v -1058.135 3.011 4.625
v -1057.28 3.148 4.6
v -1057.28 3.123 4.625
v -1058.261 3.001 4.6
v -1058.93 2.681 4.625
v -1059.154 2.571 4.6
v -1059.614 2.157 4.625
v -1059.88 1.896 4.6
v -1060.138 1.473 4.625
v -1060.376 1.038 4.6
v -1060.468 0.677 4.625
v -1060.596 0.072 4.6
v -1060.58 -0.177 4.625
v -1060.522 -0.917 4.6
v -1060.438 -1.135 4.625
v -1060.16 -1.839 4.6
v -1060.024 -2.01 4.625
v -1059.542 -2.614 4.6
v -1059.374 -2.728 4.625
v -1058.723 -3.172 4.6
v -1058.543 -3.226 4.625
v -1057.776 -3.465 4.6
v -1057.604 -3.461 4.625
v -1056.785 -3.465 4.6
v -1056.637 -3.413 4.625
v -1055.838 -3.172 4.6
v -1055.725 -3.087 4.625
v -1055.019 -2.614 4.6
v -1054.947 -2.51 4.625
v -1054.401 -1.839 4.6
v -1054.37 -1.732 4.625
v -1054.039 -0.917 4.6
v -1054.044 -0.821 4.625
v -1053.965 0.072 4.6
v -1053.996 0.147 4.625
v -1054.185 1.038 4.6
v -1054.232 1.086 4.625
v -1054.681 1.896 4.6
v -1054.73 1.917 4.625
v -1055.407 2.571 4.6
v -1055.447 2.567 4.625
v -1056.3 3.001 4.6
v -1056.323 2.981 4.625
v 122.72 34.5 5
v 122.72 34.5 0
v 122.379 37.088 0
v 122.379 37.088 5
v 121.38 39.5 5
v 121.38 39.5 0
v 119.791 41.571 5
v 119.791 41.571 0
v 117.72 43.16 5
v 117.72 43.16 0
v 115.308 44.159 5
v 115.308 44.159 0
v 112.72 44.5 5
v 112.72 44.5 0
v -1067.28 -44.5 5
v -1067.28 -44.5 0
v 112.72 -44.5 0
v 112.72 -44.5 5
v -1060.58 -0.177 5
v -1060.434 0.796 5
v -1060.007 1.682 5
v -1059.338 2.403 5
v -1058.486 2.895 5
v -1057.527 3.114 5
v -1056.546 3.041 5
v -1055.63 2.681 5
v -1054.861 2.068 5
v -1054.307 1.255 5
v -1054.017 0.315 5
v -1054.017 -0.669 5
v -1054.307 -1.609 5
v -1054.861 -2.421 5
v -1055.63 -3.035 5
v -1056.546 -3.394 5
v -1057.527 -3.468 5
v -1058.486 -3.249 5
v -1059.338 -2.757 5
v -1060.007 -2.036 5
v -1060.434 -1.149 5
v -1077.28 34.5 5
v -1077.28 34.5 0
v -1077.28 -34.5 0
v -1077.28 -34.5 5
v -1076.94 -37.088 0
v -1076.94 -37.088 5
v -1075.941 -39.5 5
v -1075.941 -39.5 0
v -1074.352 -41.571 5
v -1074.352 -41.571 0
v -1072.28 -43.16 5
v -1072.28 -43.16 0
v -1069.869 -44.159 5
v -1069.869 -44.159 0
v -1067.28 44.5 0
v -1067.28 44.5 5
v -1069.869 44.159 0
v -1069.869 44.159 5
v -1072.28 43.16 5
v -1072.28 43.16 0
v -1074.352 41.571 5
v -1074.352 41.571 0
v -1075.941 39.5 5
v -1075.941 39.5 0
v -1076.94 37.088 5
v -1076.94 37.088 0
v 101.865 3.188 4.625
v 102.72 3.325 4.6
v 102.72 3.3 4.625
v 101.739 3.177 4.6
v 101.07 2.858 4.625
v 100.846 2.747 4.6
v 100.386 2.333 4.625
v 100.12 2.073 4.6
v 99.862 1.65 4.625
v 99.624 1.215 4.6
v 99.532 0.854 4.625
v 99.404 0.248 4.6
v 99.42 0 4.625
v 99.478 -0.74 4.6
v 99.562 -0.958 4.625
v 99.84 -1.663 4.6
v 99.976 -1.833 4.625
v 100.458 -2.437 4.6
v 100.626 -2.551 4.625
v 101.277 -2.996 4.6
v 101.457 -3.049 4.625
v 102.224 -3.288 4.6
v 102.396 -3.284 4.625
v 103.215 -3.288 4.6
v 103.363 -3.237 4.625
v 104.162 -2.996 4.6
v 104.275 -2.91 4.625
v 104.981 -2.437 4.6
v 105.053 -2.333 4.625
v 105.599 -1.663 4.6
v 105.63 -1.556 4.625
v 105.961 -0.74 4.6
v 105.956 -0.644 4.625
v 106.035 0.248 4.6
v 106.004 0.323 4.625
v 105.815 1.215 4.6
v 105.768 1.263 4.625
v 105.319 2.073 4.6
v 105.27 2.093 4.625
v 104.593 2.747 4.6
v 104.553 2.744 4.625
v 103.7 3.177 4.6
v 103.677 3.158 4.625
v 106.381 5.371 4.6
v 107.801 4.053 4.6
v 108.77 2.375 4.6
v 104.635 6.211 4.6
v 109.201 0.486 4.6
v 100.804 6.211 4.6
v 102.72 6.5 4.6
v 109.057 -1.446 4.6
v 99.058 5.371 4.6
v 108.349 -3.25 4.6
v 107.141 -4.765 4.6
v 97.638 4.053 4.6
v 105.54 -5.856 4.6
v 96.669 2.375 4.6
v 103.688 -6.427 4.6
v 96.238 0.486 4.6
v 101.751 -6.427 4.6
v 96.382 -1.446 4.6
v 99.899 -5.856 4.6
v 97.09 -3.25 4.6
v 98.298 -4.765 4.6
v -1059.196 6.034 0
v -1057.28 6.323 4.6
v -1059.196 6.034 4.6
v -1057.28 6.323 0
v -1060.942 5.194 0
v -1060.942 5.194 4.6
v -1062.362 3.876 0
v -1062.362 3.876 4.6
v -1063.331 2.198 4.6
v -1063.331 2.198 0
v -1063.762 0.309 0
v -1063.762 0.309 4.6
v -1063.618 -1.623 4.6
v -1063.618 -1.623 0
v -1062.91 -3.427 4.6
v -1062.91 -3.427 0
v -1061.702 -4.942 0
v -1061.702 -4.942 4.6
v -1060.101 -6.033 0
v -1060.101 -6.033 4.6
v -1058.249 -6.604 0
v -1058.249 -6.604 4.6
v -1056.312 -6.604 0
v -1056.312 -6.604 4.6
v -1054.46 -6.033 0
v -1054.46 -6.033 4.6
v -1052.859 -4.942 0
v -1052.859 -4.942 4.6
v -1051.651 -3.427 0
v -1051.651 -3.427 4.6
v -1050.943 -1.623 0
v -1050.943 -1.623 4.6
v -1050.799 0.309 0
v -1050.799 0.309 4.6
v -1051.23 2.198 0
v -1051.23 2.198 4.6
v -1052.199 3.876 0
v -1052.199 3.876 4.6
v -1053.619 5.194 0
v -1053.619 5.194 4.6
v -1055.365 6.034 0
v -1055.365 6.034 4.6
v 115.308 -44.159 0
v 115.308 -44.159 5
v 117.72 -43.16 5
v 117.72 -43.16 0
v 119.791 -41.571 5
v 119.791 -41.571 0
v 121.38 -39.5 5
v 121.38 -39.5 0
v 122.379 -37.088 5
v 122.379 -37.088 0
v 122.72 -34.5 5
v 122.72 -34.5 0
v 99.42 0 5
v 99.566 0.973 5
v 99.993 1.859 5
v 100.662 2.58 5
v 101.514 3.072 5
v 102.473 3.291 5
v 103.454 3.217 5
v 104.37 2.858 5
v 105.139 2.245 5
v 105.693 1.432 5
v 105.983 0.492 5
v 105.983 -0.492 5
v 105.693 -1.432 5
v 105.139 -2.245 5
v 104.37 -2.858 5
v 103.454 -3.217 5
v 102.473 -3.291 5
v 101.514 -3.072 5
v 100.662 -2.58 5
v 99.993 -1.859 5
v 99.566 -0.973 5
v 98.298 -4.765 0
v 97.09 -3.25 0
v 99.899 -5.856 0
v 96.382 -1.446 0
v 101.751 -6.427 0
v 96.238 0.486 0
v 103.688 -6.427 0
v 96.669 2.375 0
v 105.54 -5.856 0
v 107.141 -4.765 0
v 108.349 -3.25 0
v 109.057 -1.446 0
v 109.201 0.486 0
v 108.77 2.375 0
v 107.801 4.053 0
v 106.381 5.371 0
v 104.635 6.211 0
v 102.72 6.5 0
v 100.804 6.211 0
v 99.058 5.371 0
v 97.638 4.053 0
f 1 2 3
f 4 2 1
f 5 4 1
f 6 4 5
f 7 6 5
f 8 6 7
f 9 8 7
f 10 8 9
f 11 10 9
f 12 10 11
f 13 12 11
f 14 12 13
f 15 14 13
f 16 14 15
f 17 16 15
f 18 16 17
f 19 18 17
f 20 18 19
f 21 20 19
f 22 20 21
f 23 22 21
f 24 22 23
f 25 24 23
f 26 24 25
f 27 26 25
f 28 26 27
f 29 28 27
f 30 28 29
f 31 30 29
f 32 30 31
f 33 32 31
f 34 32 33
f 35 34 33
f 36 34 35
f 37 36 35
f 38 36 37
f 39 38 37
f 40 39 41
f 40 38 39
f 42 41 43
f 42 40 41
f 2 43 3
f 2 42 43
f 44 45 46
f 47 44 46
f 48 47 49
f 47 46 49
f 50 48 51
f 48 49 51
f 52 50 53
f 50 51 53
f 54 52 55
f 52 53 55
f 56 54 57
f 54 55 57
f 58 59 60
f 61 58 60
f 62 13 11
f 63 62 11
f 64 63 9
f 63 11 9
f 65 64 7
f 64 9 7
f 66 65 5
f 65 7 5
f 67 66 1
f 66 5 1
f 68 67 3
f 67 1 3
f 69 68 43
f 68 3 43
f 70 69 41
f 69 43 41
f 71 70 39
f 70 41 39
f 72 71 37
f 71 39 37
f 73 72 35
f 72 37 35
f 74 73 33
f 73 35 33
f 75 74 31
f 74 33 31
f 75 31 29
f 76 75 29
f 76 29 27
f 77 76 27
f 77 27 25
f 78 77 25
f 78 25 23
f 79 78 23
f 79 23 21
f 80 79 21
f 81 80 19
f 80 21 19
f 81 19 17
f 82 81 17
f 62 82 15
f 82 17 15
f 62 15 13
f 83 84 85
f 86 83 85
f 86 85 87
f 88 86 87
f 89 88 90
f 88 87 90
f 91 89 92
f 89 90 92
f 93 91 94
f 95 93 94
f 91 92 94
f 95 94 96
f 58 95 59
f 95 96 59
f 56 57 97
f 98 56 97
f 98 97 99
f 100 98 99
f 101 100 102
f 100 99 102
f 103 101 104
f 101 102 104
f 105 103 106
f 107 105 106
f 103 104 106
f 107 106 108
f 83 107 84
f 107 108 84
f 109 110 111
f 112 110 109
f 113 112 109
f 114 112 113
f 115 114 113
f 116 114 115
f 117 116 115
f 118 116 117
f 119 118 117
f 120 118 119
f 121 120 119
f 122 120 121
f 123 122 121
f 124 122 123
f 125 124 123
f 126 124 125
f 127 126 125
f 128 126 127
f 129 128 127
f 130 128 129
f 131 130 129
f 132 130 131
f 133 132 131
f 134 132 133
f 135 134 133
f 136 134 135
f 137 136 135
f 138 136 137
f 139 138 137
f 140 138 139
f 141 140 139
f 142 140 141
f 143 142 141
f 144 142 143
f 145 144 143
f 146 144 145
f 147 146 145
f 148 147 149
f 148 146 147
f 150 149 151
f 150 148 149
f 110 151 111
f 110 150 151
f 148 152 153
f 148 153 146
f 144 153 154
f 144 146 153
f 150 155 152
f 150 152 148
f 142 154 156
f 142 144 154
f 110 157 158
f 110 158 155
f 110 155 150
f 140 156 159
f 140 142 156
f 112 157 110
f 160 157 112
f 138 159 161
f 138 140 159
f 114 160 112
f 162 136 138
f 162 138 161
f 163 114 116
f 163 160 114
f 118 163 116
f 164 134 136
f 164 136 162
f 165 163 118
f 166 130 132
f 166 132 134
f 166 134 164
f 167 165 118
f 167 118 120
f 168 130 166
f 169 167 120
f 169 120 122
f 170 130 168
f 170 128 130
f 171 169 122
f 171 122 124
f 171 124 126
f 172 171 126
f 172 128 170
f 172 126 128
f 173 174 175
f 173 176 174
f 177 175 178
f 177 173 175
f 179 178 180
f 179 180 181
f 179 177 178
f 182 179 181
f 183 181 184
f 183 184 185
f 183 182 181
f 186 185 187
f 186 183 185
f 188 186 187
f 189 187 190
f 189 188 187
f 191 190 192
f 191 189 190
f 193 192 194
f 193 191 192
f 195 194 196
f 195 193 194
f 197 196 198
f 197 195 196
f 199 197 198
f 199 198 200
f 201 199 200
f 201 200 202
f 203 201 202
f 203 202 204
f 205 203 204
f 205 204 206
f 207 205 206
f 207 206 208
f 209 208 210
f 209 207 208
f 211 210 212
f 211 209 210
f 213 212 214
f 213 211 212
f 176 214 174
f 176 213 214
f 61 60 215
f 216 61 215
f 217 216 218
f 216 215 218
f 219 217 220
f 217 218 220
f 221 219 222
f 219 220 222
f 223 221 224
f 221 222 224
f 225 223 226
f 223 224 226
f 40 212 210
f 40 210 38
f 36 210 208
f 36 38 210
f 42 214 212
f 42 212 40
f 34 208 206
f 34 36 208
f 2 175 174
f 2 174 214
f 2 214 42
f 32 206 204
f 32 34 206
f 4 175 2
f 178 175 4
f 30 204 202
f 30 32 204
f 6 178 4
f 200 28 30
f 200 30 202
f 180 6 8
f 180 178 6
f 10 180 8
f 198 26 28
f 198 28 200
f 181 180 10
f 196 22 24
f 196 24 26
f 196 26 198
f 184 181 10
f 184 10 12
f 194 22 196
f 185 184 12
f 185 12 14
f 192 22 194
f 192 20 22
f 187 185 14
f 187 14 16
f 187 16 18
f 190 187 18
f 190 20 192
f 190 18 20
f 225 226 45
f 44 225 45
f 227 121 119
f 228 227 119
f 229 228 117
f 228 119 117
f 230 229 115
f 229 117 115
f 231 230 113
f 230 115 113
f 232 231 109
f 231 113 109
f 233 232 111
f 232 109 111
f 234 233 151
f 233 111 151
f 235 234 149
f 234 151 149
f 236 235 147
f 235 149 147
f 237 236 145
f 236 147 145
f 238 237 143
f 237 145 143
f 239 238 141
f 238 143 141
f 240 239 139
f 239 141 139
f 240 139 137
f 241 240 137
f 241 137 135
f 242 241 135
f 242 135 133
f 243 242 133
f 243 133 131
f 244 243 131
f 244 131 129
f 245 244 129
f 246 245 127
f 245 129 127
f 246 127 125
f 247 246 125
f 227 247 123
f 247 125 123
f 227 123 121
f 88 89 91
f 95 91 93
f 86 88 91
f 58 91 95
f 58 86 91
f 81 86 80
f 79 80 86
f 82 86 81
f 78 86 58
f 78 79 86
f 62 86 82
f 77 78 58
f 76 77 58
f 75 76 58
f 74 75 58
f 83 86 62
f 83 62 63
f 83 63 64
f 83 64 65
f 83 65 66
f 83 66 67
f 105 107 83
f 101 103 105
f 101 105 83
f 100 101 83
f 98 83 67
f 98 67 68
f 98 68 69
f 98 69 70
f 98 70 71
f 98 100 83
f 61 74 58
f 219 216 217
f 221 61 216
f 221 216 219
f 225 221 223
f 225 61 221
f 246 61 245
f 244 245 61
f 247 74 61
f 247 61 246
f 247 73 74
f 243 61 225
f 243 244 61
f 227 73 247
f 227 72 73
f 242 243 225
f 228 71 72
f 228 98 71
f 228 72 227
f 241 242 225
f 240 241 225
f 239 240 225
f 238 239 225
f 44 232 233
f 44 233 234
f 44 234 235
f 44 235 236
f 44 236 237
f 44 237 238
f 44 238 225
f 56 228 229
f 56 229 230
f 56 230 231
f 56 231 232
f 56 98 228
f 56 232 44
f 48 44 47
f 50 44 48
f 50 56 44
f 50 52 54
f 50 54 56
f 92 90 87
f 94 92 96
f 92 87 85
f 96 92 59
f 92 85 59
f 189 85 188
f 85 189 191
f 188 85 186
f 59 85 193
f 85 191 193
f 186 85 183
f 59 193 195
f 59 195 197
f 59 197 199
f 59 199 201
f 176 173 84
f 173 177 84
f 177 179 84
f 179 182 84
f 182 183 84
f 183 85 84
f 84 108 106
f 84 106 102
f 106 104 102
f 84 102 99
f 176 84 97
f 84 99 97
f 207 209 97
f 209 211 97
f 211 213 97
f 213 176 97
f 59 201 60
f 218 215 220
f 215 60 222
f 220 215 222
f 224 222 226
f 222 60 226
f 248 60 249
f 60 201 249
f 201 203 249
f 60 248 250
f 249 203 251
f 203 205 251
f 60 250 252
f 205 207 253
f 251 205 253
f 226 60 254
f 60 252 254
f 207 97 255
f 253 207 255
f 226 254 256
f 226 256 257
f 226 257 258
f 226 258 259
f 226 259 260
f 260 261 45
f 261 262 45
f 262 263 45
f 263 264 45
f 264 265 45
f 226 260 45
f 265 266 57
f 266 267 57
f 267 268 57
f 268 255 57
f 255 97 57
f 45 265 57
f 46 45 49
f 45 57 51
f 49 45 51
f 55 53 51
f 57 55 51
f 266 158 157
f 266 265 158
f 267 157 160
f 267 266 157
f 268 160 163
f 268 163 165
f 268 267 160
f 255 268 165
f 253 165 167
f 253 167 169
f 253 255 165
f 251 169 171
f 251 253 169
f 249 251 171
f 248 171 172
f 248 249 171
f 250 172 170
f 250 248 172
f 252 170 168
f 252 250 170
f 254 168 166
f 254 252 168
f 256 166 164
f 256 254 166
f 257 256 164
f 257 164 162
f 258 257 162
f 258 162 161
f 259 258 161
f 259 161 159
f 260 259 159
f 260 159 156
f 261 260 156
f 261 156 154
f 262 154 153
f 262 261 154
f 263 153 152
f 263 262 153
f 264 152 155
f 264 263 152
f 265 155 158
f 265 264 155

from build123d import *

# Parameters (mm, degrees)
BOSS_EXTRU_1_DEPTH                         = 5
D_GAGEMENT_M61_D                           = 6.6
CHAMBRAGE_POUR_VIS_T_TE_RONDE_BOMB_2_COUNT = 2
CHAMBRAGE_POUR_VIS_T_TE_RONDE_BOMB_2_PITCH = 1160.000013464


with BuildPart() as part:
    # Esquisse1 → Boss.-Extru.1 (new body)
    with BuildSketch(Plane.XY):
        with BuildLine():
            Line((-1067.280483871, -44.5), (112.719516129, -44.5))
            ThreePointArc((112.719516129, -44.5), (119.790583941, -41.571067812), (122.719516129, -34.5))
            Line((122.719516129, -34.5), (122.719516129, 34.5))
            ThreePointArc((122.719516129, 34.5), (119.790583941, 41.571067812), (112.719516129, 44.5))
            Line((112.719516129, 44.5), (-1067.280483871, 44.5))
            ThreePointArc((-1067.280483871, 44.5), (-1074.351551683, 41.571067812), (-1077.280483871, 34.5))
            Line((-1077.280483871, 34.5), (-1077.280483871, -34.5))
            ThreePointArc((-1077.280483871, -34.5), (-1074.351551683, -41.571067812), (-1067.280483871, -44.5))
        make_face()
    extrude(amount=BOSS_EXTRU_1_DEPTH)

    # Dégagement M61 (through all)
    with Locations(Plane.XY.offset(5)):
        with Locations((-1057.280483871, -0.176736788), (102.719516129, 0)):
            Hole(D_GAGEMENT_M61_D / 2)

    # Esquisse4 → Chambrage pour vis à tête ronde bombée M61 (revolve, cut)
    with BuildSketch(Plane.YZ.offset(102.719516129)):
        Polygon((0, 0), (0, 5), (3.3, 5), (3.3, 4.625), (3.325, 4.6), (6.5, 4.6), (6.5, 0), align=None)
    chambrage_pour_vis_t_te_ronde_bomb_e_m = revolve(axis=Axis((102.719516129, 0, -6.35), (0, 0, 1)), mode=Mode.SUBTRACT)

    # Chambrage pour vis _ t_te ronde bomb 2: Chambrage pour vis à tête ronde bombée M61 ×2
    with Locations(*[Vector(-0.999999988393322, -0.00015235929857570504, 0) * (i * CHAMBRAGE_POUR_VIS_T_TE_RONDE_BOMB_2_PITCH) for i in range(1, CHAMBRAGE_POUR_VIS_T_TE_RONDE_BOMB_2_COUNT)]):
        add(chambrage_pour_vis_t_te_ronde_bomb_e_m, mode=Mode.SUBTRACT)


solid = part.part
